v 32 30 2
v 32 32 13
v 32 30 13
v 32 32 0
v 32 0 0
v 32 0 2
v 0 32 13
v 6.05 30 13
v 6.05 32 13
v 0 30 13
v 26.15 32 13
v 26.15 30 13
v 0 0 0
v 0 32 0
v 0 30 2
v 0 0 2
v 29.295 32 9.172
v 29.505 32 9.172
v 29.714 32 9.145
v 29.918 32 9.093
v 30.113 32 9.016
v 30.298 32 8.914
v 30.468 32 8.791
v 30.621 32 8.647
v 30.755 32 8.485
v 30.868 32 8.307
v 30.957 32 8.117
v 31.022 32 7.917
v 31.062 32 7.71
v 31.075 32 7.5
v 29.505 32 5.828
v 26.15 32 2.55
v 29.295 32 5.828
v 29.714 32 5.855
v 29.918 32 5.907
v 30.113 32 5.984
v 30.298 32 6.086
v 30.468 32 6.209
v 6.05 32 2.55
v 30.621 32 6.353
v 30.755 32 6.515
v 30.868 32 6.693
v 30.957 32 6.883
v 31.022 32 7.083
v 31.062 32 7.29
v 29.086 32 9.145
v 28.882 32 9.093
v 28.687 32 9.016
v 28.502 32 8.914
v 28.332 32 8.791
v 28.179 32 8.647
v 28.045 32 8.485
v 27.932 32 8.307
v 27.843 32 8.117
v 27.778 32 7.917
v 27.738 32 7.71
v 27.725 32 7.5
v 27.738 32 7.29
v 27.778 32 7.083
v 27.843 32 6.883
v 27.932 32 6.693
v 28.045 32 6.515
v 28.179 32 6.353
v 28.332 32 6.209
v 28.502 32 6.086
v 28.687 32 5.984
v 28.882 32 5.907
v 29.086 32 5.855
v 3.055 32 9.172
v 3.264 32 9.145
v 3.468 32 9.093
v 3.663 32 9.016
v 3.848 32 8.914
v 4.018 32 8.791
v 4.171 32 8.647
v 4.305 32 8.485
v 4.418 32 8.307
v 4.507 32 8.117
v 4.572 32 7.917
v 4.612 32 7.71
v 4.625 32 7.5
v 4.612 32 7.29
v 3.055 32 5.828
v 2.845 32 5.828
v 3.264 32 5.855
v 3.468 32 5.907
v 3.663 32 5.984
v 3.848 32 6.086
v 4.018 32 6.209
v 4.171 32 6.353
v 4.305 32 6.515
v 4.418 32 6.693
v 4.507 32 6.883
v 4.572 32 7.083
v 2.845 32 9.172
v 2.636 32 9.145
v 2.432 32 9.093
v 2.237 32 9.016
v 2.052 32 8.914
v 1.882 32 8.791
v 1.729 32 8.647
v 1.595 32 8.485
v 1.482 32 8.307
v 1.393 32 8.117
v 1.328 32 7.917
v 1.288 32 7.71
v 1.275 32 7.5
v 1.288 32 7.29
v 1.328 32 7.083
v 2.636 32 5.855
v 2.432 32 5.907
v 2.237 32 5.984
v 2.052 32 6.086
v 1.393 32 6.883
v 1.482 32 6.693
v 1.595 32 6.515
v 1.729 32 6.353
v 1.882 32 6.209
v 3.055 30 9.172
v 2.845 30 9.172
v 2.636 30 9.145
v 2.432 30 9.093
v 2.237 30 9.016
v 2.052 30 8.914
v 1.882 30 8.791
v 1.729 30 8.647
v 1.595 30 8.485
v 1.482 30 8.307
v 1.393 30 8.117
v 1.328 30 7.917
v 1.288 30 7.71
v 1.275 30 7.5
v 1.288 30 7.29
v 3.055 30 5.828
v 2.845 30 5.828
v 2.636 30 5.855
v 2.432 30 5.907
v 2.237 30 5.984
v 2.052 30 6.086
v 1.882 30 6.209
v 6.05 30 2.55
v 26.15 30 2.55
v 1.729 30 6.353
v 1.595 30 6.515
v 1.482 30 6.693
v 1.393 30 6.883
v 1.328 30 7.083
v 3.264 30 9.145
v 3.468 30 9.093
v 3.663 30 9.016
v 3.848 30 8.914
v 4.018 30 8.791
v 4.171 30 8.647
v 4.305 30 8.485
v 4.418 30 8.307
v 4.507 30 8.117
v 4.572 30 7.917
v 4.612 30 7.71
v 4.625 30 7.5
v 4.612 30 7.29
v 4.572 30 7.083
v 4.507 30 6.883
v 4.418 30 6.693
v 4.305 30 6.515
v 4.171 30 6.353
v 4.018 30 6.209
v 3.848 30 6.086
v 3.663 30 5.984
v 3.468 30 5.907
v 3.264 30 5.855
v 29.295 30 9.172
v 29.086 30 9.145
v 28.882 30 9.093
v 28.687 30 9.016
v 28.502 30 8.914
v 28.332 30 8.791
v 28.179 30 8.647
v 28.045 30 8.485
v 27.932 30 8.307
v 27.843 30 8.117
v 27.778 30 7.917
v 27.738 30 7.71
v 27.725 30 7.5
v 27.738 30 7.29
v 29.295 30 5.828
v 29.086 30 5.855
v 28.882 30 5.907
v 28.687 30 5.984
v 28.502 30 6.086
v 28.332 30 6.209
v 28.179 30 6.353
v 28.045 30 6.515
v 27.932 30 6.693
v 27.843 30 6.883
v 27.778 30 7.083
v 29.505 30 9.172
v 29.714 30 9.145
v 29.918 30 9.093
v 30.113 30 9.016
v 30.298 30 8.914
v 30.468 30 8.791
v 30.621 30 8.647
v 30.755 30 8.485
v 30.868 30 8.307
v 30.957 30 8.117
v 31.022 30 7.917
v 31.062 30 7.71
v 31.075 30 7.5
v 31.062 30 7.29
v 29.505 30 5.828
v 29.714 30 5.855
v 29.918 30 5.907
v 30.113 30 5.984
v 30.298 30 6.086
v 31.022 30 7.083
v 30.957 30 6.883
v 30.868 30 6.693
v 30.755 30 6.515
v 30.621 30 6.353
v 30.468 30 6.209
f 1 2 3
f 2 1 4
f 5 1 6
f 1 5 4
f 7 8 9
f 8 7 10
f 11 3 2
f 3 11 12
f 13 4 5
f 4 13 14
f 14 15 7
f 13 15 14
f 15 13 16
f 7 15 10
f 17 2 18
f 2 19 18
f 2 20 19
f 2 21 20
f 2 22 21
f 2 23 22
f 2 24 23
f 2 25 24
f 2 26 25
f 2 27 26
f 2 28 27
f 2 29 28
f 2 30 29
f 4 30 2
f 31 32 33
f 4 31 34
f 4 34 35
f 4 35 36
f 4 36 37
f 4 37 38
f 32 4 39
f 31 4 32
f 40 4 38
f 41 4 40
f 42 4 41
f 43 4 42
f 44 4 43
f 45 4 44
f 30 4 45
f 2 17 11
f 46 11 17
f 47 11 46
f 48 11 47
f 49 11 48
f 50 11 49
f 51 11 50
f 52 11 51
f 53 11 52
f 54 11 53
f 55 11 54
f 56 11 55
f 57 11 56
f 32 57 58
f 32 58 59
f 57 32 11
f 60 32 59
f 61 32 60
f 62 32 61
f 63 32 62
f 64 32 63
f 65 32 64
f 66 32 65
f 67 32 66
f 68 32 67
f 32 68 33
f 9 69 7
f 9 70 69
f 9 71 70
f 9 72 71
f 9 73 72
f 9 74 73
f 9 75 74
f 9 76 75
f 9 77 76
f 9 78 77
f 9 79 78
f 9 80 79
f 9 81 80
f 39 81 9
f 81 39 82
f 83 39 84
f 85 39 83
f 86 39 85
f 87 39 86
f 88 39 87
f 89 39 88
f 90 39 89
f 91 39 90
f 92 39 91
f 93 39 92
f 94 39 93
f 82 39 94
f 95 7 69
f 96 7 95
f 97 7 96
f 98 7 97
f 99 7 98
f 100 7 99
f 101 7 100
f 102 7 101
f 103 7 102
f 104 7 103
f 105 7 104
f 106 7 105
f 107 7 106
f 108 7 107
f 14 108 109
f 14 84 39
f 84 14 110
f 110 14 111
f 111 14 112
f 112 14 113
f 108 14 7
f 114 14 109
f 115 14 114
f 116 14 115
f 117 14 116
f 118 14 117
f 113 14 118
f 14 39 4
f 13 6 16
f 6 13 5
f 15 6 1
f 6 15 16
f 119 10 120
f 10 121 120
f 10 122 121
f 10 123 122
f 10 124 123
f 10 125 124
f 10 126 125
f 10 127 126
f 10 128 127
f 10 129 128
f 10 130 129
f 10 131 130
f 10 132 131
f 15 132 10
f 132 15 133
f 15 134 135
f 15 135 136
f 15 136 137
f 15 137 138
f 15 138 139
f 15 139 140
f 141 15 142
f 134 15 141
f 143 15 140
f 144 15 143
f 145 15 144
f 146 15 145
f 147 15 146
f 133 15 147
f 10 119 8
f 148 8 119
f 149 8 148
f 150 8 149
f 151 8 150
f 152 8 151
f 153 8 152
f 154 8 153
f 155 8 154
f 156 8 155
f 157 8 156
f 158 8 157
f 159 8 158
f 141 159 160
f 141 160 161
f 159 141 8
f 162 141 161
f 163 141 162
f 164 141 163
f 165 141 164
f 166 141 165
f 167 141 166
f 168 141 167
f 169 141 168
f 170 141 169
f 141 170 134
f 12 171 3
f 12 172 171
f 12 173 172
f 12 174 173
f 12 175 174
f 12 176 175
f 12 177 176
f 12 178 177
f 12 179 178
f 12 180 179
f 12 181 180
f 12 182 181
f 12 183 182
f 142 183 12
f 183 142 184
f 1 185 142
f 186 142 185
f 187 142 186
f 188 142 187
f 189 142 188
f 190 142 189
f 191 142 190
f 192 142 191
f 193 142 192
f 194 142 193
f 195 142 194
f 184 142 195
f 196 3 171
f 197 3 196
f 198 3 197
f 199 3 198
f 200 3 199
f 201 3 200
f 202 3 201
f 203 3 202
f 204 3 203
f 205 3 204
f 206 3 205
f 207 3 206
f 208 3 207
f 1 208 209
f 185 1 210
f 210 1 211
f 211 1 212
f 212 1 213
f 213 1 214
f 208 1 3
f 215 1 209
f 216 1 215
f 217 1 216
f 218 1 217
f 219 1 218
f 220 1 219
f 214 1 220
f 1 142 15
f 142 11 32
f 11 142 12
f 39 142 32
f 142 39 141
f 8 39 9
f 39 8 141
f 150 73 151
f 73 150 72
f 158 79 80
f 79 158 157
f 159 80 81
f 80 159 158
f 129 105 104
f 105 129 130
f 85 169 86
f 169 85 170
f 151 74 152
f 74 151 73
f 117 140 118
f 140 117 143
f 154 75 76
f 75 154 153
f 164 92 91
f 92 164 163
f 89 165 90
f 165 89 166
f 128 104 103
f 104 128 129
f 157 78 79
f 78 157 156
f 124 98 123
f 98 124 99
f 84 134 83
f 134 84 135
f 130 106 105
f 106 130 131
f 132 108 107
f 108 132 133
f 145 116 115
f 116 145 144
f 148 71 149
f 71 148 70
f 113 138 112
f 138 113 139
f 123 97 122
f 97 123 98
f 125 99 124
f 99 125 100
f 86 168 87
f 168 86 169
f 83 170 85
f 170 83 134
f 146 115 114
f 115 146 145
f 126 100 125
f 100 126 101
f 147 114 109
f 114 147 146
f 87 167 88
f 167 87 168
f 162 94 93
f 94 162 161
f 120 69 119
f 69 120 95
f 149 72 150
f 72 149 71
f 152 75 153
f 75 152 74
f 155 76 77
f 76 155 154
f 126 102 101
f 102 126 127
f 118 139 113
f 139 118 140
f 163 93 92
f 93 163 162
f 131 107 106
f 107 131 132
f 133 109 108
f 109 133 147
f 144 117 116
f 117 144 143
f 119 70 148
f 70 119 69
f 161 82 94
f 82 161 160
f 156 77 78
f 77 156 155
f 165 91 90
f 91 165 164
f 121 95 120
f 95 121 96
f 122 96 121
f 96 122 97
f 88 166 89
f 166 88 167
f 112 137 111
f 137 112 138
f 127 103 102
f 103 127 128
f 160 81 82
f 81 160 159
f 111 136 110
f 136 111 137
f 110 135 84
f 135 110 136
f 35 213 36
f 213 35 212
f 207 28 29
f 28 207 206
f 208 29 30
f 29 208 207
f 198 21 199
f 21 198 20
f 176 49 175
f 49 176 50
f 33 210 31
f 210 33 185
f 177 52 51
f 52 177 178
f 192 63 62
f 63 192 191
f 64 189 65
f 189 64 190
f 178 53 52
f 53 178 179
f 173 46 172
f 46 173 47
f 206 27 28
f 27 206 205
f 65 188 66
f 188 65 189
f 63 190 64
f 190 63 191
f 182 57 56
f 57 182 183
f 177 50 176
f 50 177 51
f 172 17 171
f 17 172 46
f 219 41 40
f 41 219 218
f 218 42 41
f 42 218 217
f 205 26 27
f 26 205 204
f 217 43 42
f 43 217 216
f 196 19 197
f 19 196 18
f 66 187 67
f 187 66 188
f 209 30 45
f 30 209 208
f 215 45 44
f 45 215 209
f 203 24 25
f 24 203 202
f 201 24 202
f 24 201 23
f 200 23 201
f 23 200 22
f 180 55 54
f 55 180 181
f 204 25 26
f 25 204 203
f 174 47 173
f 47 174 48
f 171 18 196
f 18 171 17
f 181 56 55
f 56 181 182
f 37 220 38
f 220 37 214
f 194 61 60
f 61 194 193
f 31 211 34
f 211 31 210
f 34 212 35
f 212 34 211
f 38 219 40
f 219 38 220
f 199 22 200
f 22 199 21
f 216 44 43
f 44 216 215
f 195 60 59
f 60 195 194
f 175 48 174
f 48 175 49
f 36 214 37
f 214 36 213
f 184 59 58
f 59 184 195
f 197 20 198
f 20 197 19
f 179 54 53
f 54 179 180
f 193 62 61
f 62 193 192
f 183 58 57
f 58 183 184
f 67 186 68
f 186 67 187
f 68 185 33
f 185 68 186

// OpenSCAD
// Pi Eliminator Box 
// 2025-06-13 DMW
//==================================
include <MCAD/boxes.scad>
// include <BOLTS.scad>
//include </home/dave/.local/share/OpenSCAD/libraries/BOLTS.scad>
// Wall Thickness
wallTh = 1.0;

// Inner dimensions
iLen    = 25.0 - wallTh;
iWid    = 30.0 - wallTh;
iHt     = 30.0;

// Outer Dimensions 
oLen    = 32.0;
oWid    = 32.0;
//oHt  = 34.0 + (2 * wallTh);
oHt     = 13.0;

// Plug
pLen    = 20;
pWid    = 21.1;
pHt     = 10.1;

$fn = 50;

module boltholes()
{
    //ISO4014("M2", 5);
    //echo(get_dim(DIN125A_dims("M4"),"d1"));
    //echo(get_dim(dims,"d1"));
}

module main()
{
    // Main box
    difference()
    {
        // Outer dimensions
        cube([oLen, oWid, oHt], center = false);
        translate([2*wallTh, -(2*wallTh), wallTh+1])
        {
            // Inner region
            cube([oLen, oWid, oHt], center = false);
        }
//        translate([(pWid/2) - (6*wallTh), pLen - (2*wallTh), (pHt/2) + (2*wallTh)])
//        translate([(pWid/2) - (5*wallTh), pLen - (2*wallTh), (pHt/2) + (wallTh/2)])
        translate([((pWid/2) + 0.5) - (5*wallTh), pLen - (2*wallTh), (pHt/2)-2.5])
        {
            // Cutout for plug
            cube([pWid - 1.0, pLen, pHt+2], center = false);
        }
        translate([-1, -10, (2*wallTh)])
        {
            // Cutout for right side
            cube([4, pLen * 2, 15], center = false);
        }
        // Screw Holes
        translate([2.95, oLen, oHt/2 + 1 ])
        {
             rotate([90, 0, 0])
            {
                cylinder(h=10, d=3.35, center=true);
            }
        }
        translate([29.4, oLen, oHt/2 + 1 ])
        {
            rotate([90, 0, 0])
            {
                cylinder(h=10, d=3.35, center=true);
            }
        }
    }
}

main();
